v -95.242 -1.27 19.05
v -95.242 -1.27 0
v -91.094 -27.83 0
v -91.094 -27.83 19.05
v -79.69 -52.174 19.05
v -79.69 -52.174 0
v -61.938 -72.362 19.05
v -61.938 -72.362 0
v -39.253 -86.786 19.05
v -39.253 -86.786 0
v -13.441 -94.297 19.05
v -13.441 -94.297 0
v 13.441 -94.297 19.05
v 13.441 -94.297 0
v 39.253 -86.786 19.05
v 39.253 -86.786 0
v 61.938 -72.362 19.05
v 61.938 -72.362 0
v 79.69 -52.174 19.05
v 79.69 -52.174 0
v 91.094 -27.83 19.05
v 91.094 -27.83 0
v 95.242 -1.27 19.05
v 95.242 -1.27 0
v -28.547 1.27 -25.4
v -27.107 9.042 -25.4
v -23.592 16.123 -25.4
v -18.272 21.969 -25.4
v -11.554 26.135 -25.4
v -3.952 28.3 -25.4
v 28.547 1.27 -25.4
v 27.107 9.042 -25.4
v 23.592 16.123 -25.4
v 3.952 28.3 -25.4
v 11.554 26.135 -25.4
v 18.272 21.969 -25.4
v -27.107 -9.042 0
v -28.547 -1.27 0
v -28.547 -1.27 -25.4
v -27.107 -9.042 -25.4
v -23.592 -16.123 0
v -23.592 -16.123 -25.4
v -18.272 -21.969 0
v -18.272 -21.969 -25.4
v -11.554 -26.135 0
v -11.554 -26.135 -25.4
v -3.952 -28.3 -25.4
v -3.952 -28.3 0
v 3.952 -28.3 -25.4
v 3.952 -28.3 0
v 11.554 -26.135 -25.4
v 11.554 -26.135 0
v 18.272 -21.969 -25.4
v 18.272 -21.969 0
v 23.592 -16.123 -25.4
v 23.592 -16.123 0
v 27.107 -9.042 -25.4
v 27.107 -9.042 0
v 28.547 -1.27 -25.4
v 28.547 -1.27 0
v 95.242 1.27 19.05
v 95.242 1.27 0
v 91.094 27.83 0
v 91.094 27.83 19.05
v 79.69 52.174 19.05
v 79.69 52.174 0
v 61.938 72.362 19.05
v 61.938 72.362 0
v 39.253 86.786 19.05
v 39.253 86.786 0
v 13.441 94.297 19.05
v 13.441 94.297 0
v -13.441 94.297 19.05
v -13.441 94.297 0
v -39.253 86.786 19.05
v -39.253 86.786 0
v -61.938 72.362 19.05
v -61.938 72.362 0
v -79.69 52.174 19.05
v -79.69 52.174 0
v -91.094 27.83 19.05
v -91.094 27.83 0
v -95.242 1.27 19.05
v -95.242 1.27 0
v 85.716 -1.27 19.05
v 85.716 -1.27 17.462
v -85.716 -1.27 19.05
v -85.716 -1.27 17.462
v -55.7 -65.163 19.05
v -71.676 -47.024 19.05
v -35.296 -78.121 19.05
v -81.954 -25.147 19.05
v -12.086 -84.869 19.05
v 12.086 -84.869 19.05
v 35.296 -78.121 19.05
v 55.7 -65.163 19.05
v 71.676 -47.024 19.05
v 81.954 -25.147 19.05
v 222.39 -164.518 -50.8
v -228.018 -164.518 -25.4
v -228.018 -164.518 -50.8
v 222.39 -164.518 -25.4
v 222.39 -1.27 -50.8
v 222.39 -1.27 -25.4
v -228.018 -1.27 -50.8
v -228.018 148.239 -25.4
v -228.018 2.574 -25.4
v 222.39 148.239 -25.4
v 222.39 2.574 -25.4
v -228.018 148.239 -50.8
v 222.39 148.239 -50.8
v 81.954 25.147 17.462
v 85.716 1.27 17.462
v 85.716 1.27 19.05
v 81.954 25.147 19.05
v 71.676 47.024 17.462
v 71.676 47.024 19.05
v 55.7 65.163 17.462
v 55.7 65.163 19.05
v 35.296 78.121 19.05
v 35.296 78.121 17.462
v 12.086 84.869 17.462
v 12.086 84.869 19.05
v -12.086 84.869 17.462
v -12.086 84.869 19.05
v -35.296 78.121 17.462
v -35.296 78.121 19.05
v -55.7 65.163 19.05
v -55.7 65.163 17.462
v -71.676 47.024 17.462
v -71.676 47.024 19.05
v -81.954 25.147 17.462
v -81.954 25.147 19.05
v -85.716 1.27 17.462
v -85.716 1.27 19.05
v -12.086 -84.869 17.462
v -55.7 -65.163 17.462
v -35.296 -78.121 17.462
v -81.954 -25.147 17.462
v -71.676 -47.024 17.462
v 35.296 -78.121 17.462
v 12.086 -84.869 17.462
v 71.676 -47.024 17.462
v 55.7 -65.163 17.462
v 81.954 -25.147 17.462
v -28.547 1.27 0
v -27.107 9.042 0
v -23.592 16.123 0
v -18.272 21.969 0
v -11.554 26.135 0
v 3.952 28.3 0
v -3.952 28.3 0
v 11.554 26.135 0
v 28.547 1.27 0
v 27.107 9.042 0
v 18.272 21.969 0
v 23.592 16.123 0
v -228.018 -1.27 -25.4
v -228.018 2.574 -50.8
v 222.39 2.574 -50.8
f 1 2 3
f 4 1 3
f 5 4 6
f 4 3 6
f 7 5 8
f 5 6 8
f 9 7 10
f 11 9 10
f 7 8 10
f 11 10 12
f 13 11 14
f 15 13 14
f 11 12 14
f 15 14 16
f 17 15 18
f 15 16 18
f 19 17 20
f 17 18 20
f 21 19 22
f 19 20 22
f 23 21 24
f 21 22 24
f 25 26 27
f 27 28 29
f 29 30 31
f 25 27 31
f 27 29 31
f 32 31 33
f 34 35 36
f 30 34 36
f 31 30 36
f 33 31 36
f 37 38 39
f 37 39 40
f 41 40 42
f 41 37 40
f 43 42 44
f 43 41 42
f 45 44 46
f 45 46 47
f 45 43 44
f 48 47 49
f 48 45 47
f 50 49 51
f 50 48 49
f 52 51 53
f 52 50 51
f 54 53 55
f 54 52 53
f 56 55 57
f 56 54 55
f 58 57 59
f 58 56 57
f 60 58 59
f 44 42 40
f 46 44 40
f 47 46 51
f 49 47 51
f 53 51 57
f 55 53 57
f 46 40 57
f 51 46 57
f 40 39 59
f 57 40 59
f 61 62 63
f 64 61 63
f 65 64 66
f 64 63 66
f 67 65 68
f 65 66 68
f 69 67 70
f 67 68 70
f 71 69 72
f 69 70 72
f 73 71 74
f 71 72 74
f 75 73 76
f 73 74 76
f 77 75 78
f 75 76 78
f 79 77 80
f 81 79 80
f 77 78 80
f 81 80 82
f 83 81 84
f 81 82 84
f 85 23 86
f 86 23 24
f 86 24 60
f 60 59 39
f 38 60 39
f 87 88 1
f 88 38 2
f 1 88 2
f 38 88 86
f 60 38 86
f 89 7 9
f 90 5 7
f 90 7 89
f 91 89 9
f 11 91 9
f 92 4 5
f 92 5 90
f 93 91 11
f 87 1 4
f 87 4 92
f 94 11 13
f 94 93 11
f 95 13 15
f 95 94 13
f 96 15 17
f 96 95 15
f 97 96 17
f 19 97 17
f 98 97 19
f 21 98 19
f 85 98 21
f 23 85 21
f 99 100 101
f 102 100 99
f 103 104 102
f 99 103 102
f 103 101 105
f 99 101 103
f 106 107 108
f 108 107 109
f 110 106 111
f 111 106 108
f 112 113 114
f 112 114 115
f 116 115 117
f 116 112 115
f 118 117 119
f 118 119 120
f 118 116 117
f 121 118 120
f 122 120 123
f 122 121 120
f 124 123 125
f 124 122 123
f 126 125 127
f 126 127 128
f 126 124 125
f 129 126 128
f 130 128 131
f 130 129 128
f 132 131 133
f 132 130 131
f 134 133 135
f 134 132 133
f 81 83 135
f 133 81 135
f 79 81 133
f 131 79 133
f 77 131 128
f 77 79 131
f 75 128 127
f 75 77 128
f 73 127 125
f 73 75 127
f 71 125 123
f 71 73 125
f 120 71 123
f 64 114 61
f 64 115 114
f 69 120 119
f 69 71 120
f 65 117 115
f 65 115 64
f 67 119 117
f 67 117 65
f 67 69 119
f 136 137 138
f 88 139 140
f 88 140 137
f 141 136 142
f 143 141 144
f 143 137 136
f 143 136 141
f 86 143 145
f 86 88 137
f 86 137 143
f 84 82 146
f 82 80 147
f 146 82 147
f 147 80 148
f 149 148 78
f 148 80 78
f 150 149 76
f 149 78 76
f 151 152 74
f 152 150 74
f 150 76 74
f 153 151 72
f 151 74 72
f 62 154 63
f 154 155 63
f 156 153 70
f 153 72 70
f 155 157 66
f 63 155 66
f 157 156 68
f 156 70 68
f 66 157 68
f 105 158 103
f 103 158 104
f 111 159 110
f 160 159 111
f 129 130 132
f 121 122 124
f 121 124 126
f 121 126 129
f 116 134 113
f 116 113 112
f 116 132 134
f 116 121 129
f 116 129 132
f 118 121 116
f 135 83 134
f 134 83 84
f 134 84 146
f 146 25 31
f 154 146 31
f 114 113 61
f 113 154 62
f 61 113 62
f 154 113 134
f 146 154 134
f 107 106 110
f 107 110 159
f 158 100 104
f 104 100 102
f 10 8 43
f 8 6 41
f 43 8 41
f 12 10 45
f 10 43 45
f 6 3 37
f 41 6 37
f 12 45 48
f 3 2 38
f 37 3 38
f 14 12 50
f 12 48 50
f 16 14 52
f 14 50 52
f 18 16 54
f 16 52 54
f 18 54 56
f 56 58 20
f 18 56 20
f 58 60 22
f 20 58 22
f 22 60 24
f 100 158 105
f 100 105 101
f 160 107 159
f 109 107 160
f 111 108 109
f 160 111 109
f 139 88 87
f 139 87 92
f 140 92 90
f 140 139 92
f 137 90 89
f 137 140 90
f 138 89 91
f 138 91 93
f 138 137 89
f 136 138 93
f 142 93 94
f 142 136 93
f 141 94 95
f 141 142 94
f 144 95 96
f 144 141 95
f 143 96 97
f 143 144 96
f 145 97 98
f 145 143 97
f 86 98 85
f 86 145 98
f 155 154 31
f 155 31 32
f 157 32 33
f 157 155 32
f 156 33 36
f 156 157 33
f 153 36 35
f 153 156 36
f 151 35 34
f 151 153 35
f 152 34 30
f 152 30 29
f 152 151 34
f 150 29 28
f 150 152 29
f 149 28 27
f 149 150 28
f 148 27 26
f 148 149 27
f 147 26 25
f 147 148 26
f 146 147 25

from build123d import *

# Parameters (mm, degrees)
F0_R     = 95.25
F0_R_2   = 85.725
F1_DEPTH = 19.05
F0_R_3   = 28.575
F2_DEPTH = 17.4625
F3_DEPTH = 25.4
F5_DEPTH = 44.451
F6_W     = 450.4083395004
F6_H     = 145.6645973958
F7_DEPTH = 25.4
F6_H_2   = 163.2482669163


# Not quite as in the source:
# - a feature of the source that left no trace in its solid (it failed there, or was rolled back) is left out


with BuildPart() as f1:
    # F0 (on Top) → F1 (new body)
    with BuildSketch(Plane.XY):
        Circle(F0_R)
        Circle(F0_R_2, mode=Mode.SUBTRACT)
    extrude(amount=F1_DEPTH)

    # F0 (on Top) → F2 (join)
    with BuildSketch(Plane.XY):
        Circle(F0_R_2)
        Circle(F0_R_3, mode=Mode.SUBTRACT)
        Circle(F0_R_3)
    extrude(amount=F2_DEPTH)

    # F0 (on Top) → F3 (join)
    with BuildSketch(Plane.XY):
        Circle(F0_R_3)
    extrude(amount=-F3_DEPTH)

    # F4 (on face) → F5 (cut, through all)
    with BuildSketch(Plane(origin=(0, 0, -25.4), x_dir=(1, 0, 0), z_dir=(0, 0, -1))):
        with BuildLine():
            Line((165.4538214207, -1.27), (165.4538214207, 0))
            Line((165.4538214207, 0), (165.4538214207, 1.27))
            Line((165.4538214207, 1.27), (28.5467638271, 1.27))
            ThreePointArc((28.5467638271, 1.27), (28.5679400846, 0.6351569258), (28.575, 0))
            ThreePointArc((28.575, 0), (28.5679400846, -0.6351569258), (28.5467638271, -1.27))
            Line((28.5467638271, -1.27), (165.4538214207, -1.27))
        make_face()
        with BuildLine():
            Line((-28.5467638271, -1.27), (28.5467638271, -1.27))
            ThreePointArc((28.5467638271, -1.27), (28.5679400846, -0.6351569258), (28.575, 0))
            ThreePointArc((28.575, 0), (28.5679400846, 0.6351569258), (28.5467638271, 1.27))
            Line((28.5467638271, 1.27), (-28.5467638271, 1.27))
            ThreePointArc((-28.5467638271, 1.27), (-28.575, 0), (-28.5467638271, -1.27))
        make_face()
        with BuildLine():
            Line((-119.8632493615, -1.27), (-28.5467638271, -1.27))
            ThreePointArc((-28.5467638271, -1.27), (-28.575, 0), (-28.5467638271, 1.27))
            Line((-28.5467638271, 1.27), (-119.8632493615, 1.27))
            Line((-119.8632493615, 1.27), (-119.8632493615, -1.27))
        make_face()
    extrude(amount=-F5_DEPTH, mode=Mode.SUBTRACT)


with BuildPart() as f7:
    # F6 (on face) → F7 (new body)
    with BuildSketch(Plane(origin=(0, 0, -25.4), x_dir=(1, 0, 0), z_dir=(0, 0, -1))):
        with Locations((-2.8137415648, -75.4063900094)):
            Rectangle(F6_W, F6_H)
    extrude(amount=F7_DEPTH)


with BuildPart() as f7b:
    # F6 (on face) → F7, piece 2 (new body)
    with BuildSketch(Plane(origin=(0, 0, -25.4), x_dir=(1, 0, 0), z_dir=(0, 0, -1))):
        with Locations((-2.8137415648, 82.8941334581)):
            Rectangle(F6_W, F6_H_2)
    extrude(amount=F7_DEPTH)


solid = Compound([f1.part, f7.part, f7b.part])
